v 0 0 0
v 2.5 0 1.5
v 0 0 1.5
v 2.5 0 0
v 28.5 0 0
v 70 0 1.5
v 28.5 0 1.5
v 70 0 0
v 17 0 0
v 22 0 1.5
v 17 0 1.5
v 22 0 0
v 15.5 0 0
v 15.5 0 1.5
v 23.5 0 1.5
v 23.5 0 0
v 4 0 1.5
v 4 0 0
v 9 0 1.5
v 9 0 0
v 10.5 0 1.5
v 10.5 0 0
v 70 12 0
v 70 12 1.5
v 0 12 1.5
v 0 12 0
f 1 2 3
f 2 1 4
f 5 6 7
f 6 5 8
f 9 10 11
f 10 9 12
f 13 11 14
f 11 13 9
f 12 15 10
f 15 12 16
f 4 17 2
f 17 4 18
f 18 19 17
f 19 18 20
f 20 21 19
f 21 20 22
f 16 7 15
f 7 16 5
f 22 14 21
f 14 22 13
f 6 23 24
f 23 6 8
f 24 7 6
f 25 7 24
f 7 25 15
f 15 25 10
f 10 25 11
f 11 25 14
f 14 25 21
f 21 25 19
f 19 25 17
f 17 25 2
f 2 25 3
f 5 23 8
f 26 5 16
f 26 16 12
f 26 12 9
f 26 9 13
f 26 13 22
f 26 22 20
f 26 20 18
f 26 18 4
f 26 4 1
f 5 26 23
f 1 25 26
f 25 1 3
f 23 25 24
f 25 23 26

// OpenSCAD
// Define dimensions
$fn = 64; // Number of facets for curved surfaces

// Dimensions of the comb
comb_width = 70;
comb_height = 12;
tooth_width = 5;
tooth_length = 12;
gap_width = 1.5;

// Calculate total width and height of the teeth row
total_teeth_width = tooth_width * 10 + gap_width * (9); // 9 gaps between 10 teeth

// Positioning the comb on the bed
comb_position_x = -comb_width / 2;
comb_position_y = -comb_height / 2;

// Thickness of the comb
comb_thickness = 1.5; // Corrected thickness

// Create the comb
difference() {
    // Base of the comb
    cube([comb_width, comb_height, comb_thickness]);

    // Teeth row
    for (i=[0:9]) {
        translate([comb_position_x + i * (tooth_width + gap_width), comb_position_y - tooth_length / 2, 0]) {
            cube([tooth_width, tooth_length, comb_thickness]);
        }
    }
}
